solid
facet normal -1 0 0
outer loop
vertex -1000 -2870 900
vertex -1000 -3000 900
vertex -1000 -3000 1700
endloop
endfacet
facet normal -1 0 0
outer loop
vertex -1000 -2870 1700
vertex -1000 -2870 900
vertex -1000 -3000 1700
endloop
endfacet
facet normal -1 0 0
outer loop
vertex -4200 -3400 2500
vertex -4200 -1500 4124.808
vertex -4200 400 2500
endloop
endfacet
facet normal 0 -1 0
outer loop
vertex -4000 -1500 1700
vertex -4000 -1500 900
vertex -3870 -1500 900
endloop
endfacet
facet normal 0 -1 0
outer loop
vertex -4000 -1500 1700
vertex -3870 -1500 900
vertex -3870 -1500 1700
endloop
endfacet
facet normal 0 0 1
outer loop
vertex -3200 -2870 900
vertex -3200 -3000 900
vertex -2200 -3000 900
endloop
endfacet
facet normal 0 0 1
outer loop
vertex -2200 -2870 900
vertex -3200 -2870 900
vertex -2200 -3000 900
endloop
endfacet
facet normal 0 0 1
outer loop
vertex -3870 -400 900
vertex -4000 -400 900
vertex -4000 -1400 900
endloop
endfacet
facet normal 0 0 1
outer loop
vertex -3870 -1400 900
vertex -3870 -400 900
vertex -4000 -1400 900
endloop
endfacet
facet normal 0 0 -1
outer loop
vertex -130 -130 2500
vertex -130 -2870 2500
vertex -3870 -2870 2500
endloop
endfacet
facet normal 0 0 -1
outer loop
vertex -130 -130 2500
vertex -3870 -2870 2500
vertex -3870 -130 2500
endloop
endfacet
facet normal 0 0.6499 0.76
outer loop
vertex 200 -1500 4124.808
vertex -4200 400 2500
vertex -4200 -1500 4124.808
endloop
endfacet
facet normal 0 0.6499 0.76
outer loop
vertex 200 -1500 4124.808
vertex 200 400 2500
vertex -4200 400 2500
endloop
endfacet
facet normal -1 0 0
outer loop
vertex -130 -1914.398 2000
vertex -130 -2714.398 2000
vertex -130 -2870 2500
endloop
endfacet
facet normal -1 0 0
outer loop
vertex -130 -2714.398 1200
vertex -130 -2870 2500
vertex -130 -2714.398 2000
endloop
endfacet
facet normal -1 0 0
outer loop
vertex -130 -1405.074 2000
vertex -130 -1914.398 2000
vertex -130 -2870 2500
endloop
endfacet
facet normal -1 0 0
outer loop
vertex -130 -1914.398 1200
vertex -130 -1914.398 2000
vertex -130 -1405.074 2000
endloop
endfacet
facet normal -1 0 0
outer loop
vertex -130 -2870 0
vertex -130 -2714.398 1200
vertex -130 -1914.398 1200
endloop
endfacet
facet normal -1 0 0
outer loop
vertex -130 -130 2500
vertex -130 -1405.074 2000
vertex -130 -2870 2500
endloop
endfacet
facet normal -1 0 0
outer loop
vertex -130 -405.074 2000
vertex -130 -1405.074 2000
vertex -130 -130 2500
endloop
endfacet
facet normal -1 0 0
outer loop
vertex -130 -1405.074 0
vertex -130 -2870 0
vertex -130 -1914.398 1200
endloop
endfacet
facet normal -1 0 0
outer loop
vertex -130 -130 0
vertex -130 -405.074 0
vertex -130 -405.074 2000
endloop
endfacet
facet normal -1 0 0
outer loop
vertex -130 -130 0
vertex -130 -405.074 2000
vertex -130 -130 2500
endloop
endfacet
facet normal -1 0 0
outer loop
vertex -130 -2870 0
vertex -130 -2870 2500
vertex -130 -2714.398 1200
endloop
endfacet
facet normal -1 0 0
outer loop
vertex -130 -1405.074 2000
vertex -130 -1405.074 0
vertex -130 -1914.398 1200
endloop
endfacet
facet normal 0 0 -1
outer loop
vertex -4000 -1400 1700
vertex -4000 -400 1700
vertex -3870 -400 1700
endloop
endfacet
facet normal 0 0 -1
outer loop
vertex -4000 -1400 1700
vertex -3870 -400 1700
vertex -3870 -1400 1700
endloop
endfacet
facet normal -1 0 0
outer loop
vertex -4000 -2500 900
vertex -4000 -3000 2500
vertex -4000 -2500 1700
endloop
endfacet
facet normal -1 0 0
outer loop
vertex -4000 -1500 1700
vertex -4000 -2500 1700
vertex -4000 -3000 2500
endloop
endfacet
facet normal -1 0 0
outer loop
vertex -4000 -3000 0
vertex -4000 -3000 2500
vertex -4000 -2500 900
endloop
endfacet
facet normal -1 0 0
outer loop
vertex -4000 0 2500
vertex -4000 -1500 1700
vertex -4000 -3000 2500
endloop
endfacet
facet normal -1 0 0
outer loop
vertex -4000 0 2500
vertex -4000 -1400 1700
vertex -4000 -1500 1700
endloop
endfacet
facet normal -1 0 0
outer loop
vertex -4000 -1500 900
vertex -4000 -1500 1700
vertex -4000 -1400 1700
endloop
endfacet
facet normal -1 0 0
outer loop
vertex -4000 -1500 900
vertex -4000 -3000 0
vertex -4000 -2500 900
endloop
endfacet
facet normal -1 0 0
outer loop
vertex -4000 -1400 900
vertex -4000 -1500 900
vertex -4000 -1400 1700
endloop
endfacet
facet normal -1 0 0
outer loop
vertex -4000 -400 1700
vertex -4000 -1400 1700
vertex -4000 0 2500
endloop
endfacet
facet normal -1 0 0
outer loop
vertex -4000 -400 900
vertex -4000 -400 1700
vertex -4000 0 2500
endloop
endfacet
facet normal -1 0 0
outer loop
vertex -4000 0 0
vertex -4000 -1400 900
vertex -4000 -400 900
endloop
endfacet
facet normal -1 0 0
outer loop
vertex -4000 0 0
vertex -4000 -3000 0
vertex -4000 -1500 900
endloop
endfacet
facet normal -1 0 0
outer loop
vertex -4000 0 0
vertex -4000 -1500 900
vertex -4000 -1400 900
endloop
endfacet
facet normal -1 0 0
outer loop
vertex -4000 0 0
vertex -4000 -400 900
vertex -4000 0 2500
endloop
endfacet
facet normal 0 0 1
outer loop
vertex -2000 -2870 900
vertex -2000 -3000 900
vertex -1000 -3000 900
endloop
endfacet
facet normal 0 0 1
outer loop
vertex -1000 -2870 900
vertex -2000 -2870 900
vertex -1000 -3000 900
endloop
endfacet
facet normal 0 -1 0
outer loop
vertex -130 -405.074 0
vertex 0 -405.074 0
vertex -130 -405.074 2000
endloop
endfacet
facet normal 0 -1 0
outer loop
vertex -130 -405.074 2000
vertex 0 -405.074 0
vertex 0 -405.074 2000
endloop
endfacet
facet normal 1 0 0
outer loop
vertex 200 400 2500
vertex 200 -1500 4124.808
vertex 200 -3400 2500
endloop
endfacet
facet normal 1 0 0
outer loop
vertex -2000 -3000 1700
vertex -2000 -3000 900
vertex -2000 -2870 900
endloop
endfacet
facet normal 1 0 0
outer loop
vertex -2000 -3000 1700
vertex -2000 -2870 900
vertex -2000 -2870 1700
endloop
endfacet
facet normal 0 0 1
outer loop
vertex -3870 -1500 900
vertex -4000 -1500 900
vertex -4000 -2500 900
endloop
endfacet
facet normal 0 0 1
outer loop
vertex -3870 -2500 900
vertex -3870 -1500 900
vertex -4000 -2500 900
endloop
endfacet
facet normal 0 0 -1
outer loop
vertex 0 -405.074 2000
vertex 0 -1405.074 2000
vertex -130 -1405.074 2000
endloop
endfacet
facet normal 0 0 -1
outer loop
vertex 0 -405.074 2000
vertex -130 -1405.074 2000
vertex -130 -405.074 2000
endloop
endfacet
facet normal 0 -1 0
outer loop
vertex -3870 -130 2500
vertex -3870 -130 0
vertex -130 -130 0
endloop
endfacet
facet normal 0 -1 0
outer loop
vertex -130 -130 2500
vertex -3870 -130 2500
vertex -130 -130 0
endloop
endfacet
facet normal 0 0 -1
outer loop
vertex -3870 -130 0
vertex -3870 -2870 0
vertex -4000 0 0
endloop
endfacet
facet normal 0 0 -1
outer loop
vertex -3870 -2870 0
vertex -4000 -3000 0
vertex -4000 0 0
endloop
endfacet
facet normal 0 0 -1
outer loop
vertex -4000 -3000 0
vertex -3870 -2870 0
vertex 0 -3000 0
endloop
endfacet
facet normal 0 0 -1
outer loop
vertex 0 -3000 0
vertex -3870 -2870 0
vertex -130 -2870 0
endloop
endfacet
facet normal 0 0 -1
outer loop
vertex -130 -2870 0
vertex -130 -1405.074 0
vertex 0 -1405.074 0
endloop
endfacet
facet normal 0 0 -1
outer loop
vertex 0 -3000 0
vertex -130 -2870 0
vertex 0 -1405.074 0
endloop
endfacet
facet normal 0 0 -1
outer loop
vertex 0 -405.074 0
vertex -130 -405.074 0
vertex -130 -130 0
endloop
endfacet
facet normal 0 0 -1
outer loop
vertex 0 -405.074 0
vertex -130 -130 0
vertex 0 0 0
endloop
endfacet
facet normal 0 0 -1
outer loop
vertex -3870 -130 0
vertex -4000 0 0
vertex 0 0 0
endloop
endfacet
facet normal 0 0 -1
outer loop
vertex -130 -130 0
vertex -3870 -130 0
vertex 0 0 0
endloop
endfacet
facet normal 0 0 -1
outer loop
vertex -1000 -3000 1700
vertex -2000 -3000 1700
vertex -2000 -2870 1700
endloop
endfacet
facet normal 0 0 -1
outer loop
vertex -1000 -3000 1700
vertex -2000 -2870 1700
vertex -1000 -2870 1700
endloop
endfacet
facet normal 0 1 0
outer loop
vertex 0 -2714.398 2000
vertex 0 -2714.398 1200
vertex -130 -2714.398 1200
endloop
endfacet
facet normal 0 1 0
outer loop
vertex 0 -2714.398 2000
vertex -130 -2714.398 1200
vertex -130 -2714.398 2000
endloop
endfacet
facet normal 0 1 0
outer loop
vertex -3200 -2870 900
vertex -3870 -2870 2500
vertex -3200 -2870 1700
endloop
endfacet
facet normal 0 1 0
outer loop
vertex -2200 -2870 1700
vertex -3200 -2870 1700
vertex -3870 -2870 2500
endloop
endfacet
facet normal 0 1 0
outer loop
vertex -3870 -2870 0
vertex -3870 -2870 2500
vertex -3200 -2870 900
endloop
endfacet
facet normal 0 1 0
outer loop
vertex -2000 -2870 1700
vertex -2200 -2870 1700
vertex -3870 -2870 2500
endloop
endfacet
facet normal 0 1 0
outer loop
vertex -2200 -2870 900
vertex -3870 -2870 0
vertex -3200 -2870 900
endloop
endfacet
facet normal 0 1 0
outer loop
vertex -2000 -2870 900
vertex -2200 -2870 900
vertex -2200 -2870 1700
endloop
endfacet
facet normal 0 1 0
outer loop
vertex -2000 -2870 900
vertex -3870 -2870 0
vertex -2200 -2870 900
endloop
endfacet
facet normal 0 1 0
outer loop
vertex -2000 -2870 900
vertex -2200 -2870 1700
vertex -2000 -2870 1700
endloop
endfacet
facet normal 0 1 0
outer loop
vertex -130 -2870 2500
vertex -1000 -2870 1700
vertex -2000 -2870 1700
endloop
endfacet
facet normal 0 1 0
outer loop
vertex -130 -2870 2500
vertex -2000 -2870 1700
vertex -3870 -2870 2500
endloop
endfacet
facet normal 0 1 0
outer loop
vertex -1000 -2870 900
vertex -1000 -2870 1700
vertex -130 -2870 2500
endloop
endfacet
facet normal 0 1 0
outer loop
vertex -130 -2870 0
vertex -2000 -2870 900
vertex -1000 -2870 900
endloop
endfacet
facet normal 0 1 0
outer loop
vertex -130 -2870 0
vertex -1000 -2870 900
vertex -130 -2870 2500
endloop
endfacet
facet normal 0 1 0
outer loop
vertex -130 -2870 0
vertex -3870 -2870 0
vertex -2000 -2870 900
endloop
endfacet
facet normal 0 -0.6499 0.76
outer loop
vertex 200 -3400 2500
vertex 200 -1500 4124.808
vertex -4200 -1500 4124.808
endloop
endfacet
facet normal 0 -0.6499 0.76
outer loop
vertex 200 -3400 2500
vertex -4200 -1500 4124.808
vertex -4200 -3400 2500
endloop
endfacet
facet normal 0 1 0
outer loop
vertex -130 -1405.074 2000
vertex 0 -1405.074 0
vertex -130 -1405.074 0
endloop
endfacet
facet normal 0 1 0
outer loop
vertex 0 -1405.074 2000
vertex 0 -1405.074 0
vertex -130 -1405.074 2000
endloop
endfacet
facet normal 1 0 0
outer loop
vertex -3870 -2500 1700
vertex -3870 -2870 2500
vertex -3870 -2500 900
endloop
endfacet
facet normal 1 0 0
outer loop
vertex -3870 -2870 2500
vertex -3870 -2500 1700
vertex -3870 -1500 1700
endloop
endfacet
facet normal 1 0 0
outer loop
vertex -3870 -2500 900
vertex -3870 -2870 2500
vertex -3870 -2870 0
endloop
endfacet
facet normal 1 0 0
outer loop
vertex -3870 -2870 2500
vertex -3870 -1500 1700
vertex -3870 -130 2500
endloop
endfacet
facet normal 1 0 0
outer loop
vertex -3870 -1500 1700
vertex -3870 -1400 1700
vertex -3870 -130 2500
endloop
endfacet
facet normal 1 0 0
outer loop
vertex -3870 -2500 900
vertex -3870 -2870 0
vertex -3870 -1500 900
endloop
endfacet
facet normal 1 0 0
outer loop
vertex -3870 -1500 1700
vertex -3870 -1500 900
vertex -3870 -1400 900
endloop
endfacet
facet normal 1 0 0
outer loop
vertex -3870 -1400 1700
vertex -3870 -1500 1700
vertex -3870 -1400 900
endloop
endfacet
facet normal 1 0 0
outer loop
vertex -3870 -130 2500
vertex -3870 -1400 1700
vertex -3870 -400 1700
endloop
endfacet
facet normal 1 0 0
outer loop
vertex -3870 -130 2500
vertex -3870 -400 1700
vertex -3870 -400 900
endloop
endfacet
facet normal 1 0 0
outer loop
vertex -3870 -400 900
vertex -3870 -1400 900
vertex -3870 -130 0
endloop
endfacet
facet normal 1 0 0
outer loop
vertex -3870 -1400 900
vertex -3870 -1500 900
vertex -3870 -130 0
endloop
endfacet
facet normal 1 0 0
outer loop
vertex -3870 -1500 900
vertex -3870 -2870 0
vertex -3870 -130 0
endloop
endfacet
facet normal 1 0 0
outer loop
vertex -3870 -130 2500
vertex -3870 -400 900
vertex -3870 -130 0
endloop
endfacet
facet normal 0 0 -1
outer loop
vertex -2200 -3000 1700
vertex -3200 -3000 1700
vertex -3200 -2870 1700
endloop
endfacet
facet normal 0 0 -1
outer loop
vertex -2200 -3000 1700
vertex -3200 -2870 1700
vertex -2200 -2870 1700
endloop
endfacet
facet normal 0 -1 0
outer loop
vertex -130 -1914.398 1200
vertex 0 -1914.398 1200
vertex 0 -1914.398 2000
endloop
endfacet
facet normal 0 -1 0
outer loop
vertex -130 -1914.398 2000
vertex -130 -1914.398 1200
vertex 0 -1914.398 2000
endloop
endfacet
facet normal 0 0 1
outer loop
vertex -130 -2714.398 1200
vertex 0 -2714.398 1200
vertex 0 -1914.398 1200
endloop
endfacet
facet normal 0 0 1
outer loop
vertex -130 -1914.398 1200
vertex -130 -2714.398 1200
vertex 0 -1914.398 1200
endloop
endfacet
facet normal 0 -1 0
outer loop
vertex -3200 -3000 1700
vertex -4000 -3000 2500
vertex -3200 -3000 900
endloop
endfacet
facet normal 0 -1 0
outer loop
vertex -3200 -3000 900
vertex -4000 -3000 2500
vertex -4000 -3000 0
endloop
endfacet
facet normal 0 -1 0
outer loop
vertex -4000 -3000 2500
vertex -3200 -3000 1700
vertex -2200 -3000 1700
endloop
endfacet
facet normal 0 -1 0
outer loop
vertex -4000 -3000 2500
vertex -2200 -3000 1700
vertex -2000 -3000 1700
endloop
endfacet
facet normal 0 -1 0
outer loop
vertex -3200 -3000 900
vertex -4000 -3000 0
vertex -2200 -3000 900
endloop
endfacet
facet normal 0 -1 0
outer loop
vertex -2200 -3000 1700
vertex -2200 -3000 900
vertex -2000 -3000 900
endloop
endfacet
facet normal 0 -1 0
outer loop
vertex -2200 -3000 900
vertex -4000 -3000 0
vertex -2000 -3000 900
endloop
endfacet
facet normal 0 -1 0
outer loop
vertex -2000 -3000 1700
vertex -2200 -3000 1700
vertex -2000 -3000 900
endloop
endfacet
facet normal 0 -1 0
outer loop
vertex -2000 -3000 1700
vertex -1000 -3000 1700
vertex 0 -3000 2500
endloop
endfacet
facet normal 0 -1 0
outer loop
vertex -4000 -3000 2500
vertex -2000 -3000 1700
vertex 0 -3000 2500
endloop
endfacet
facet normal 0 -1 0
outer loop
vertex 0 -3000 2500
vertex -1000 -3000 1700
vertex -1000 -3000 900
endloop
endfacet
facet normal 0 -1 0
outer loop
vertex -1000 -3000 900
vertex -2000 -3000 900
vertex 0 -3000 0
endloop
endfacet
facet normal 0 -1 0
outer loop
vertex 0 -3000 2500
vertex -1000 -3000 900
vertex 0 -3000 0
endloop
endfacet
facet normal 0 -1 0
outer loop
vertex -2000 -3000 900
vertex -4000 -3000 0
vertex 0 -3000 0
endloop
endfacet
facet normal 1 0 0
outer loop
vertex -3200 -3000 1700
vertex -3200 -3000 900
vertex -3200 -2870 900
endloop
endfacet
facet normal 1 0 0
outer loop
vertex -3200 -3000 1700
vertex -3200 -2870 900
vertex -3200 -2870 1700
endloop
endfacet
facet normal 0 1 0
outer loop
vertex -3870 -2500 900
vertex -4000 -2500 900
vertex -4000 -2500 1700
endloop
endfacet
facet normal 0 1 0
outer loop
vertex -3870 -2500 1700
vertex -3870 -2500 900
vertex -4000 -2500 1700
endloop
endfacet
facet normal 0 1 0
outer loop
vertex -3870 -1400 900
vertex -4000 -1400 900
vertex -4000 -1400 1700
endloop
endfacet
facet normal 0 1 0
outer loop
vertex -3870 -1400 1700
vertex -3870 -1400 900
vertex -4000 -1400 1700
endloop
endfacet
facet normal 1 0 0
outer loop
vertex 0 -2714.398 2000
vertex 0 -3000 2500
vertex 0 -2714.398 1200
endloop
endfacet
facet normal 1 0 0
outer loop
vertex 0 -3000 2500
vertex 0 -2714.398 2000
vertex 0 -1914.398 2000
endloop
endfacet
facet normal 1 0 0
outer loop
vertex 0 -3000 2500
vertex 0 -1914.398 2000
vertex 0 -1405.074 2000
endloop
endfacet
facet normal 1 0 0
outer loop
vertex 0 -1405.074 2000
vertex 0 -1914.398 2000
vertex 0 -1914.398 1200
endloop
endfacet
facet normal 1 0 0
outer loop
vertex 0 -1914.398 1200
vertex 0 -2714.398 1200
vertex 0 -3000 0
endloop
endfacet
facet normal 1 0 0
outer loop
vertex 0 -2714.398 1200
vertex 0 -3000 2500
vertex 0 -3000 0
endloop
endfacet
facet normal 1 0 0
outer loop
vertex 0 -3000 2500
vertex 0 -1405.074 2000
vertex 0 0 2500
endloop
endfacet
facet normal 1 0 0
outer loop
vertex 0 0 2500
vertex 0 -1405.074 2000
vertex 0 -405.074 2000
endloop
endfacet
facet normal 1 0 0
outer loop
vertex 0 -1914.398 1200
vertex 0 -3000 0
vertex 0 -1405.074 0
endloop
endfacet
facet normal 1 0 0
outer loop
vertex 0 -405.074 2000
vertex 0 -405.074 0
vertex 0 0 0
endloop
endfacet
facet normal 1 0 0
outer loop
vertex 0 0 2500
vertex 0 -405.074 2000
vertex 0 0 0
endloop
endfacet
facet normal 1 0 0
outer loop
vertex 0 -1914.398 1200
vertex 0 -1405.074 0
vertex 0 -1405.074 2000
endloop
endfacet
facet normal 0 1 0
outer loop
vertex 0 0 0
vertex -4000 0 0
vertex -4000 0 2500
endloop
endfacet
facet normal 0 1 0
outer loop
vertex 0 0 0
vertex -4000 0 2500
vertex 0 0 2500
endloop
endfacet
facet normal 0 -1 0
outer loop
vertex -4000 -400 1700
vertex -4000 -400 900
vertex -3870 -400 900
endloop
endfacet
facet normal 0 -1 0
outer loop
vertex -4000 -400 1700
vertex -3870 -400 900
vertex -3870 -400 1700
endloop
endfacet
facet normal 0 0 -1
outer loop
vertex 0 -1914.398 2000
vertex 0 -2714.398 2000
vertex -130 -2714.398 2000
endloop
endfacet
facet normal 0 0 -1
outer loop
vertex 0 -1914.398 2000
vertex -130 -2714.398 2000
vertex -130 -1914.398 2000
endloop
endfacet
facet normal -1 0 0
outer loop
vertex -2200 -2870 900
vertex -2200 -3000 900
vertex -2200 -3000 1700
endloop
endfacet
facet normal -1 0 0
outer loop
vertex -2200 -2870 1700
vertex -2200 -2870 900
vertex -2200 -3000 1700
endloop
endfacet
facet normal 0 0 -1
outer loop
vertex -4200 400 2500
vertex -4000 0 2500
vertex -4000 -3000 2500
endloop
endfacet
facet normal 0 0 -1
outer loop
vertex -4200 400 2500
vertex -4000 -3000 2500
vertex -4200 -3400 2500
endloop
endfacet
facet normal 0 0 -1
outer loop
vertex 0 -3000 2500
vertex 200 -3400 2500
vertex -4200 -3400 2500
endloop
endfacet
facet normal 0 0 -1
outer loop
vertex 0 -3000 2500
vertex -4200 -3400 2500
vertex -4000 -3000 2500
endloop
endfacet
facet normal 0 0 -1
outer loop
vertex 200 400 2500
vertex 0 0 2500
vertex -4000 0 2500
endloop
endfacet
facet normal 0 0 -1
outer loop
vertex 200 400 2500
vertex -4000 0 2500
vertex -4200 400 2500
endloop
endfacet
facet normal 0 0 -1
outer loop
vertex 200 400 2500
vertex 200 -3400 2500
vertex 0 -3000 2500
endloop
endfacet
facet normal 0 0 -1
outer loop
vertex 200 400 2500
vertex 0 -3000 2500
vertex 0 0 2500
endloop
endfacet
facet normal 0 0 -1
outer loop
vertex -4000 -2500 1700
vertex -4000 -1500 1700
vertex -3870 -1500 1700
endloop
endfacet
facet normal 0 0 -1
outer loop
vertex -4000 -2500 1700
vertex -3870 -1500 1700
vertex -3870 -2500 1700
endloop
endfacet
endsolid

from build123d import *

# Parameters (mm, degrees)
F0_W          = 4000
F0_H          = 3000
F0_W_2        = 3739.999772
F0_H_2        = 2739.999772
F1_DEPTH      = 2500
F2_W          = 1000
F2_H          = 2000
F2_W_2        = 800
F2_H_2        = 800
F3_DEPTH      = 200
F4_W          = 1000
F4_H          = 800
F5_DEPTH      = 200
F7_DEPTH      = 200
F7_DEPTH_BACK = 4200
F8_W          = 1000
F8_H          = 800
F9_DEPTH      = 200


with BuildPart() as f1:
    # F0 (on Top) → F1 (new body)
    with BuildSketch(Plane.XY):
        with Locations((-2000, -1500)):
            Rectangle(F0_W, F0_H)
        with Locations((-2000, -1500)):
            Rectangle(F0_W_2, F0_H_2, mode=Mode.SUBTRACT)
    extrude(amount=F1_DEPTH)

    # F2 (on face) → F3 (cut)
    with BuildSketch(Plane.YZ):
        with Locations((-905.074239, 1000)):
            Rectangle(F2_W, F2_H)
        with Locations((-2314.397669, 1600)):
            Rectangle(F2_W_2, F2_H_2)
    extrude(amount=-F3_DEPTH, mode=Mode.SUBTRACT)

    # F4 (on face) → F5 (cut)
    with BuildSketch(Plane.XZ.offset(3000)):
        with Locations((-2700, 1300)):
            Rectangle(F4_W, F4_H)
        with Locations((-1500, 1300)):
            Rectangle(F4_W, F4_H)
    extrude(amount=-F5_DEPTH, mode=Mode.SUBTRACT)

    # F6 (on face) → F7 (join, two sides)
    with BuildSketch(Plane.YZ) as f7_sk:
        Polygon((-3000, 2500), (0, 2500), (400, 2500), (-1500, 4124.807681), (-3400, 2500), align=None)
    extrude(amount=F7_DEPTH)
    extrude(f7_sk.sketch, amount=-F7_DEPTH_BACK)

    # F8 (on face) → F9 (cut)
    with BuildSketch(Plane(origin=(-4000, 0, 0), x_dir=(0, -1, 0), z_dir=(-1, 0, 0))):
        with Locations((900, 1300)):
            Rectangle(F8_W, F8_H)
        with Locations((2000, 1300)):
            Rectangle(F8_W, F8_H)
    extrude(amount=-F9_DEPTH, mode=Mode.SUBTRACT)


solid = f1.part
